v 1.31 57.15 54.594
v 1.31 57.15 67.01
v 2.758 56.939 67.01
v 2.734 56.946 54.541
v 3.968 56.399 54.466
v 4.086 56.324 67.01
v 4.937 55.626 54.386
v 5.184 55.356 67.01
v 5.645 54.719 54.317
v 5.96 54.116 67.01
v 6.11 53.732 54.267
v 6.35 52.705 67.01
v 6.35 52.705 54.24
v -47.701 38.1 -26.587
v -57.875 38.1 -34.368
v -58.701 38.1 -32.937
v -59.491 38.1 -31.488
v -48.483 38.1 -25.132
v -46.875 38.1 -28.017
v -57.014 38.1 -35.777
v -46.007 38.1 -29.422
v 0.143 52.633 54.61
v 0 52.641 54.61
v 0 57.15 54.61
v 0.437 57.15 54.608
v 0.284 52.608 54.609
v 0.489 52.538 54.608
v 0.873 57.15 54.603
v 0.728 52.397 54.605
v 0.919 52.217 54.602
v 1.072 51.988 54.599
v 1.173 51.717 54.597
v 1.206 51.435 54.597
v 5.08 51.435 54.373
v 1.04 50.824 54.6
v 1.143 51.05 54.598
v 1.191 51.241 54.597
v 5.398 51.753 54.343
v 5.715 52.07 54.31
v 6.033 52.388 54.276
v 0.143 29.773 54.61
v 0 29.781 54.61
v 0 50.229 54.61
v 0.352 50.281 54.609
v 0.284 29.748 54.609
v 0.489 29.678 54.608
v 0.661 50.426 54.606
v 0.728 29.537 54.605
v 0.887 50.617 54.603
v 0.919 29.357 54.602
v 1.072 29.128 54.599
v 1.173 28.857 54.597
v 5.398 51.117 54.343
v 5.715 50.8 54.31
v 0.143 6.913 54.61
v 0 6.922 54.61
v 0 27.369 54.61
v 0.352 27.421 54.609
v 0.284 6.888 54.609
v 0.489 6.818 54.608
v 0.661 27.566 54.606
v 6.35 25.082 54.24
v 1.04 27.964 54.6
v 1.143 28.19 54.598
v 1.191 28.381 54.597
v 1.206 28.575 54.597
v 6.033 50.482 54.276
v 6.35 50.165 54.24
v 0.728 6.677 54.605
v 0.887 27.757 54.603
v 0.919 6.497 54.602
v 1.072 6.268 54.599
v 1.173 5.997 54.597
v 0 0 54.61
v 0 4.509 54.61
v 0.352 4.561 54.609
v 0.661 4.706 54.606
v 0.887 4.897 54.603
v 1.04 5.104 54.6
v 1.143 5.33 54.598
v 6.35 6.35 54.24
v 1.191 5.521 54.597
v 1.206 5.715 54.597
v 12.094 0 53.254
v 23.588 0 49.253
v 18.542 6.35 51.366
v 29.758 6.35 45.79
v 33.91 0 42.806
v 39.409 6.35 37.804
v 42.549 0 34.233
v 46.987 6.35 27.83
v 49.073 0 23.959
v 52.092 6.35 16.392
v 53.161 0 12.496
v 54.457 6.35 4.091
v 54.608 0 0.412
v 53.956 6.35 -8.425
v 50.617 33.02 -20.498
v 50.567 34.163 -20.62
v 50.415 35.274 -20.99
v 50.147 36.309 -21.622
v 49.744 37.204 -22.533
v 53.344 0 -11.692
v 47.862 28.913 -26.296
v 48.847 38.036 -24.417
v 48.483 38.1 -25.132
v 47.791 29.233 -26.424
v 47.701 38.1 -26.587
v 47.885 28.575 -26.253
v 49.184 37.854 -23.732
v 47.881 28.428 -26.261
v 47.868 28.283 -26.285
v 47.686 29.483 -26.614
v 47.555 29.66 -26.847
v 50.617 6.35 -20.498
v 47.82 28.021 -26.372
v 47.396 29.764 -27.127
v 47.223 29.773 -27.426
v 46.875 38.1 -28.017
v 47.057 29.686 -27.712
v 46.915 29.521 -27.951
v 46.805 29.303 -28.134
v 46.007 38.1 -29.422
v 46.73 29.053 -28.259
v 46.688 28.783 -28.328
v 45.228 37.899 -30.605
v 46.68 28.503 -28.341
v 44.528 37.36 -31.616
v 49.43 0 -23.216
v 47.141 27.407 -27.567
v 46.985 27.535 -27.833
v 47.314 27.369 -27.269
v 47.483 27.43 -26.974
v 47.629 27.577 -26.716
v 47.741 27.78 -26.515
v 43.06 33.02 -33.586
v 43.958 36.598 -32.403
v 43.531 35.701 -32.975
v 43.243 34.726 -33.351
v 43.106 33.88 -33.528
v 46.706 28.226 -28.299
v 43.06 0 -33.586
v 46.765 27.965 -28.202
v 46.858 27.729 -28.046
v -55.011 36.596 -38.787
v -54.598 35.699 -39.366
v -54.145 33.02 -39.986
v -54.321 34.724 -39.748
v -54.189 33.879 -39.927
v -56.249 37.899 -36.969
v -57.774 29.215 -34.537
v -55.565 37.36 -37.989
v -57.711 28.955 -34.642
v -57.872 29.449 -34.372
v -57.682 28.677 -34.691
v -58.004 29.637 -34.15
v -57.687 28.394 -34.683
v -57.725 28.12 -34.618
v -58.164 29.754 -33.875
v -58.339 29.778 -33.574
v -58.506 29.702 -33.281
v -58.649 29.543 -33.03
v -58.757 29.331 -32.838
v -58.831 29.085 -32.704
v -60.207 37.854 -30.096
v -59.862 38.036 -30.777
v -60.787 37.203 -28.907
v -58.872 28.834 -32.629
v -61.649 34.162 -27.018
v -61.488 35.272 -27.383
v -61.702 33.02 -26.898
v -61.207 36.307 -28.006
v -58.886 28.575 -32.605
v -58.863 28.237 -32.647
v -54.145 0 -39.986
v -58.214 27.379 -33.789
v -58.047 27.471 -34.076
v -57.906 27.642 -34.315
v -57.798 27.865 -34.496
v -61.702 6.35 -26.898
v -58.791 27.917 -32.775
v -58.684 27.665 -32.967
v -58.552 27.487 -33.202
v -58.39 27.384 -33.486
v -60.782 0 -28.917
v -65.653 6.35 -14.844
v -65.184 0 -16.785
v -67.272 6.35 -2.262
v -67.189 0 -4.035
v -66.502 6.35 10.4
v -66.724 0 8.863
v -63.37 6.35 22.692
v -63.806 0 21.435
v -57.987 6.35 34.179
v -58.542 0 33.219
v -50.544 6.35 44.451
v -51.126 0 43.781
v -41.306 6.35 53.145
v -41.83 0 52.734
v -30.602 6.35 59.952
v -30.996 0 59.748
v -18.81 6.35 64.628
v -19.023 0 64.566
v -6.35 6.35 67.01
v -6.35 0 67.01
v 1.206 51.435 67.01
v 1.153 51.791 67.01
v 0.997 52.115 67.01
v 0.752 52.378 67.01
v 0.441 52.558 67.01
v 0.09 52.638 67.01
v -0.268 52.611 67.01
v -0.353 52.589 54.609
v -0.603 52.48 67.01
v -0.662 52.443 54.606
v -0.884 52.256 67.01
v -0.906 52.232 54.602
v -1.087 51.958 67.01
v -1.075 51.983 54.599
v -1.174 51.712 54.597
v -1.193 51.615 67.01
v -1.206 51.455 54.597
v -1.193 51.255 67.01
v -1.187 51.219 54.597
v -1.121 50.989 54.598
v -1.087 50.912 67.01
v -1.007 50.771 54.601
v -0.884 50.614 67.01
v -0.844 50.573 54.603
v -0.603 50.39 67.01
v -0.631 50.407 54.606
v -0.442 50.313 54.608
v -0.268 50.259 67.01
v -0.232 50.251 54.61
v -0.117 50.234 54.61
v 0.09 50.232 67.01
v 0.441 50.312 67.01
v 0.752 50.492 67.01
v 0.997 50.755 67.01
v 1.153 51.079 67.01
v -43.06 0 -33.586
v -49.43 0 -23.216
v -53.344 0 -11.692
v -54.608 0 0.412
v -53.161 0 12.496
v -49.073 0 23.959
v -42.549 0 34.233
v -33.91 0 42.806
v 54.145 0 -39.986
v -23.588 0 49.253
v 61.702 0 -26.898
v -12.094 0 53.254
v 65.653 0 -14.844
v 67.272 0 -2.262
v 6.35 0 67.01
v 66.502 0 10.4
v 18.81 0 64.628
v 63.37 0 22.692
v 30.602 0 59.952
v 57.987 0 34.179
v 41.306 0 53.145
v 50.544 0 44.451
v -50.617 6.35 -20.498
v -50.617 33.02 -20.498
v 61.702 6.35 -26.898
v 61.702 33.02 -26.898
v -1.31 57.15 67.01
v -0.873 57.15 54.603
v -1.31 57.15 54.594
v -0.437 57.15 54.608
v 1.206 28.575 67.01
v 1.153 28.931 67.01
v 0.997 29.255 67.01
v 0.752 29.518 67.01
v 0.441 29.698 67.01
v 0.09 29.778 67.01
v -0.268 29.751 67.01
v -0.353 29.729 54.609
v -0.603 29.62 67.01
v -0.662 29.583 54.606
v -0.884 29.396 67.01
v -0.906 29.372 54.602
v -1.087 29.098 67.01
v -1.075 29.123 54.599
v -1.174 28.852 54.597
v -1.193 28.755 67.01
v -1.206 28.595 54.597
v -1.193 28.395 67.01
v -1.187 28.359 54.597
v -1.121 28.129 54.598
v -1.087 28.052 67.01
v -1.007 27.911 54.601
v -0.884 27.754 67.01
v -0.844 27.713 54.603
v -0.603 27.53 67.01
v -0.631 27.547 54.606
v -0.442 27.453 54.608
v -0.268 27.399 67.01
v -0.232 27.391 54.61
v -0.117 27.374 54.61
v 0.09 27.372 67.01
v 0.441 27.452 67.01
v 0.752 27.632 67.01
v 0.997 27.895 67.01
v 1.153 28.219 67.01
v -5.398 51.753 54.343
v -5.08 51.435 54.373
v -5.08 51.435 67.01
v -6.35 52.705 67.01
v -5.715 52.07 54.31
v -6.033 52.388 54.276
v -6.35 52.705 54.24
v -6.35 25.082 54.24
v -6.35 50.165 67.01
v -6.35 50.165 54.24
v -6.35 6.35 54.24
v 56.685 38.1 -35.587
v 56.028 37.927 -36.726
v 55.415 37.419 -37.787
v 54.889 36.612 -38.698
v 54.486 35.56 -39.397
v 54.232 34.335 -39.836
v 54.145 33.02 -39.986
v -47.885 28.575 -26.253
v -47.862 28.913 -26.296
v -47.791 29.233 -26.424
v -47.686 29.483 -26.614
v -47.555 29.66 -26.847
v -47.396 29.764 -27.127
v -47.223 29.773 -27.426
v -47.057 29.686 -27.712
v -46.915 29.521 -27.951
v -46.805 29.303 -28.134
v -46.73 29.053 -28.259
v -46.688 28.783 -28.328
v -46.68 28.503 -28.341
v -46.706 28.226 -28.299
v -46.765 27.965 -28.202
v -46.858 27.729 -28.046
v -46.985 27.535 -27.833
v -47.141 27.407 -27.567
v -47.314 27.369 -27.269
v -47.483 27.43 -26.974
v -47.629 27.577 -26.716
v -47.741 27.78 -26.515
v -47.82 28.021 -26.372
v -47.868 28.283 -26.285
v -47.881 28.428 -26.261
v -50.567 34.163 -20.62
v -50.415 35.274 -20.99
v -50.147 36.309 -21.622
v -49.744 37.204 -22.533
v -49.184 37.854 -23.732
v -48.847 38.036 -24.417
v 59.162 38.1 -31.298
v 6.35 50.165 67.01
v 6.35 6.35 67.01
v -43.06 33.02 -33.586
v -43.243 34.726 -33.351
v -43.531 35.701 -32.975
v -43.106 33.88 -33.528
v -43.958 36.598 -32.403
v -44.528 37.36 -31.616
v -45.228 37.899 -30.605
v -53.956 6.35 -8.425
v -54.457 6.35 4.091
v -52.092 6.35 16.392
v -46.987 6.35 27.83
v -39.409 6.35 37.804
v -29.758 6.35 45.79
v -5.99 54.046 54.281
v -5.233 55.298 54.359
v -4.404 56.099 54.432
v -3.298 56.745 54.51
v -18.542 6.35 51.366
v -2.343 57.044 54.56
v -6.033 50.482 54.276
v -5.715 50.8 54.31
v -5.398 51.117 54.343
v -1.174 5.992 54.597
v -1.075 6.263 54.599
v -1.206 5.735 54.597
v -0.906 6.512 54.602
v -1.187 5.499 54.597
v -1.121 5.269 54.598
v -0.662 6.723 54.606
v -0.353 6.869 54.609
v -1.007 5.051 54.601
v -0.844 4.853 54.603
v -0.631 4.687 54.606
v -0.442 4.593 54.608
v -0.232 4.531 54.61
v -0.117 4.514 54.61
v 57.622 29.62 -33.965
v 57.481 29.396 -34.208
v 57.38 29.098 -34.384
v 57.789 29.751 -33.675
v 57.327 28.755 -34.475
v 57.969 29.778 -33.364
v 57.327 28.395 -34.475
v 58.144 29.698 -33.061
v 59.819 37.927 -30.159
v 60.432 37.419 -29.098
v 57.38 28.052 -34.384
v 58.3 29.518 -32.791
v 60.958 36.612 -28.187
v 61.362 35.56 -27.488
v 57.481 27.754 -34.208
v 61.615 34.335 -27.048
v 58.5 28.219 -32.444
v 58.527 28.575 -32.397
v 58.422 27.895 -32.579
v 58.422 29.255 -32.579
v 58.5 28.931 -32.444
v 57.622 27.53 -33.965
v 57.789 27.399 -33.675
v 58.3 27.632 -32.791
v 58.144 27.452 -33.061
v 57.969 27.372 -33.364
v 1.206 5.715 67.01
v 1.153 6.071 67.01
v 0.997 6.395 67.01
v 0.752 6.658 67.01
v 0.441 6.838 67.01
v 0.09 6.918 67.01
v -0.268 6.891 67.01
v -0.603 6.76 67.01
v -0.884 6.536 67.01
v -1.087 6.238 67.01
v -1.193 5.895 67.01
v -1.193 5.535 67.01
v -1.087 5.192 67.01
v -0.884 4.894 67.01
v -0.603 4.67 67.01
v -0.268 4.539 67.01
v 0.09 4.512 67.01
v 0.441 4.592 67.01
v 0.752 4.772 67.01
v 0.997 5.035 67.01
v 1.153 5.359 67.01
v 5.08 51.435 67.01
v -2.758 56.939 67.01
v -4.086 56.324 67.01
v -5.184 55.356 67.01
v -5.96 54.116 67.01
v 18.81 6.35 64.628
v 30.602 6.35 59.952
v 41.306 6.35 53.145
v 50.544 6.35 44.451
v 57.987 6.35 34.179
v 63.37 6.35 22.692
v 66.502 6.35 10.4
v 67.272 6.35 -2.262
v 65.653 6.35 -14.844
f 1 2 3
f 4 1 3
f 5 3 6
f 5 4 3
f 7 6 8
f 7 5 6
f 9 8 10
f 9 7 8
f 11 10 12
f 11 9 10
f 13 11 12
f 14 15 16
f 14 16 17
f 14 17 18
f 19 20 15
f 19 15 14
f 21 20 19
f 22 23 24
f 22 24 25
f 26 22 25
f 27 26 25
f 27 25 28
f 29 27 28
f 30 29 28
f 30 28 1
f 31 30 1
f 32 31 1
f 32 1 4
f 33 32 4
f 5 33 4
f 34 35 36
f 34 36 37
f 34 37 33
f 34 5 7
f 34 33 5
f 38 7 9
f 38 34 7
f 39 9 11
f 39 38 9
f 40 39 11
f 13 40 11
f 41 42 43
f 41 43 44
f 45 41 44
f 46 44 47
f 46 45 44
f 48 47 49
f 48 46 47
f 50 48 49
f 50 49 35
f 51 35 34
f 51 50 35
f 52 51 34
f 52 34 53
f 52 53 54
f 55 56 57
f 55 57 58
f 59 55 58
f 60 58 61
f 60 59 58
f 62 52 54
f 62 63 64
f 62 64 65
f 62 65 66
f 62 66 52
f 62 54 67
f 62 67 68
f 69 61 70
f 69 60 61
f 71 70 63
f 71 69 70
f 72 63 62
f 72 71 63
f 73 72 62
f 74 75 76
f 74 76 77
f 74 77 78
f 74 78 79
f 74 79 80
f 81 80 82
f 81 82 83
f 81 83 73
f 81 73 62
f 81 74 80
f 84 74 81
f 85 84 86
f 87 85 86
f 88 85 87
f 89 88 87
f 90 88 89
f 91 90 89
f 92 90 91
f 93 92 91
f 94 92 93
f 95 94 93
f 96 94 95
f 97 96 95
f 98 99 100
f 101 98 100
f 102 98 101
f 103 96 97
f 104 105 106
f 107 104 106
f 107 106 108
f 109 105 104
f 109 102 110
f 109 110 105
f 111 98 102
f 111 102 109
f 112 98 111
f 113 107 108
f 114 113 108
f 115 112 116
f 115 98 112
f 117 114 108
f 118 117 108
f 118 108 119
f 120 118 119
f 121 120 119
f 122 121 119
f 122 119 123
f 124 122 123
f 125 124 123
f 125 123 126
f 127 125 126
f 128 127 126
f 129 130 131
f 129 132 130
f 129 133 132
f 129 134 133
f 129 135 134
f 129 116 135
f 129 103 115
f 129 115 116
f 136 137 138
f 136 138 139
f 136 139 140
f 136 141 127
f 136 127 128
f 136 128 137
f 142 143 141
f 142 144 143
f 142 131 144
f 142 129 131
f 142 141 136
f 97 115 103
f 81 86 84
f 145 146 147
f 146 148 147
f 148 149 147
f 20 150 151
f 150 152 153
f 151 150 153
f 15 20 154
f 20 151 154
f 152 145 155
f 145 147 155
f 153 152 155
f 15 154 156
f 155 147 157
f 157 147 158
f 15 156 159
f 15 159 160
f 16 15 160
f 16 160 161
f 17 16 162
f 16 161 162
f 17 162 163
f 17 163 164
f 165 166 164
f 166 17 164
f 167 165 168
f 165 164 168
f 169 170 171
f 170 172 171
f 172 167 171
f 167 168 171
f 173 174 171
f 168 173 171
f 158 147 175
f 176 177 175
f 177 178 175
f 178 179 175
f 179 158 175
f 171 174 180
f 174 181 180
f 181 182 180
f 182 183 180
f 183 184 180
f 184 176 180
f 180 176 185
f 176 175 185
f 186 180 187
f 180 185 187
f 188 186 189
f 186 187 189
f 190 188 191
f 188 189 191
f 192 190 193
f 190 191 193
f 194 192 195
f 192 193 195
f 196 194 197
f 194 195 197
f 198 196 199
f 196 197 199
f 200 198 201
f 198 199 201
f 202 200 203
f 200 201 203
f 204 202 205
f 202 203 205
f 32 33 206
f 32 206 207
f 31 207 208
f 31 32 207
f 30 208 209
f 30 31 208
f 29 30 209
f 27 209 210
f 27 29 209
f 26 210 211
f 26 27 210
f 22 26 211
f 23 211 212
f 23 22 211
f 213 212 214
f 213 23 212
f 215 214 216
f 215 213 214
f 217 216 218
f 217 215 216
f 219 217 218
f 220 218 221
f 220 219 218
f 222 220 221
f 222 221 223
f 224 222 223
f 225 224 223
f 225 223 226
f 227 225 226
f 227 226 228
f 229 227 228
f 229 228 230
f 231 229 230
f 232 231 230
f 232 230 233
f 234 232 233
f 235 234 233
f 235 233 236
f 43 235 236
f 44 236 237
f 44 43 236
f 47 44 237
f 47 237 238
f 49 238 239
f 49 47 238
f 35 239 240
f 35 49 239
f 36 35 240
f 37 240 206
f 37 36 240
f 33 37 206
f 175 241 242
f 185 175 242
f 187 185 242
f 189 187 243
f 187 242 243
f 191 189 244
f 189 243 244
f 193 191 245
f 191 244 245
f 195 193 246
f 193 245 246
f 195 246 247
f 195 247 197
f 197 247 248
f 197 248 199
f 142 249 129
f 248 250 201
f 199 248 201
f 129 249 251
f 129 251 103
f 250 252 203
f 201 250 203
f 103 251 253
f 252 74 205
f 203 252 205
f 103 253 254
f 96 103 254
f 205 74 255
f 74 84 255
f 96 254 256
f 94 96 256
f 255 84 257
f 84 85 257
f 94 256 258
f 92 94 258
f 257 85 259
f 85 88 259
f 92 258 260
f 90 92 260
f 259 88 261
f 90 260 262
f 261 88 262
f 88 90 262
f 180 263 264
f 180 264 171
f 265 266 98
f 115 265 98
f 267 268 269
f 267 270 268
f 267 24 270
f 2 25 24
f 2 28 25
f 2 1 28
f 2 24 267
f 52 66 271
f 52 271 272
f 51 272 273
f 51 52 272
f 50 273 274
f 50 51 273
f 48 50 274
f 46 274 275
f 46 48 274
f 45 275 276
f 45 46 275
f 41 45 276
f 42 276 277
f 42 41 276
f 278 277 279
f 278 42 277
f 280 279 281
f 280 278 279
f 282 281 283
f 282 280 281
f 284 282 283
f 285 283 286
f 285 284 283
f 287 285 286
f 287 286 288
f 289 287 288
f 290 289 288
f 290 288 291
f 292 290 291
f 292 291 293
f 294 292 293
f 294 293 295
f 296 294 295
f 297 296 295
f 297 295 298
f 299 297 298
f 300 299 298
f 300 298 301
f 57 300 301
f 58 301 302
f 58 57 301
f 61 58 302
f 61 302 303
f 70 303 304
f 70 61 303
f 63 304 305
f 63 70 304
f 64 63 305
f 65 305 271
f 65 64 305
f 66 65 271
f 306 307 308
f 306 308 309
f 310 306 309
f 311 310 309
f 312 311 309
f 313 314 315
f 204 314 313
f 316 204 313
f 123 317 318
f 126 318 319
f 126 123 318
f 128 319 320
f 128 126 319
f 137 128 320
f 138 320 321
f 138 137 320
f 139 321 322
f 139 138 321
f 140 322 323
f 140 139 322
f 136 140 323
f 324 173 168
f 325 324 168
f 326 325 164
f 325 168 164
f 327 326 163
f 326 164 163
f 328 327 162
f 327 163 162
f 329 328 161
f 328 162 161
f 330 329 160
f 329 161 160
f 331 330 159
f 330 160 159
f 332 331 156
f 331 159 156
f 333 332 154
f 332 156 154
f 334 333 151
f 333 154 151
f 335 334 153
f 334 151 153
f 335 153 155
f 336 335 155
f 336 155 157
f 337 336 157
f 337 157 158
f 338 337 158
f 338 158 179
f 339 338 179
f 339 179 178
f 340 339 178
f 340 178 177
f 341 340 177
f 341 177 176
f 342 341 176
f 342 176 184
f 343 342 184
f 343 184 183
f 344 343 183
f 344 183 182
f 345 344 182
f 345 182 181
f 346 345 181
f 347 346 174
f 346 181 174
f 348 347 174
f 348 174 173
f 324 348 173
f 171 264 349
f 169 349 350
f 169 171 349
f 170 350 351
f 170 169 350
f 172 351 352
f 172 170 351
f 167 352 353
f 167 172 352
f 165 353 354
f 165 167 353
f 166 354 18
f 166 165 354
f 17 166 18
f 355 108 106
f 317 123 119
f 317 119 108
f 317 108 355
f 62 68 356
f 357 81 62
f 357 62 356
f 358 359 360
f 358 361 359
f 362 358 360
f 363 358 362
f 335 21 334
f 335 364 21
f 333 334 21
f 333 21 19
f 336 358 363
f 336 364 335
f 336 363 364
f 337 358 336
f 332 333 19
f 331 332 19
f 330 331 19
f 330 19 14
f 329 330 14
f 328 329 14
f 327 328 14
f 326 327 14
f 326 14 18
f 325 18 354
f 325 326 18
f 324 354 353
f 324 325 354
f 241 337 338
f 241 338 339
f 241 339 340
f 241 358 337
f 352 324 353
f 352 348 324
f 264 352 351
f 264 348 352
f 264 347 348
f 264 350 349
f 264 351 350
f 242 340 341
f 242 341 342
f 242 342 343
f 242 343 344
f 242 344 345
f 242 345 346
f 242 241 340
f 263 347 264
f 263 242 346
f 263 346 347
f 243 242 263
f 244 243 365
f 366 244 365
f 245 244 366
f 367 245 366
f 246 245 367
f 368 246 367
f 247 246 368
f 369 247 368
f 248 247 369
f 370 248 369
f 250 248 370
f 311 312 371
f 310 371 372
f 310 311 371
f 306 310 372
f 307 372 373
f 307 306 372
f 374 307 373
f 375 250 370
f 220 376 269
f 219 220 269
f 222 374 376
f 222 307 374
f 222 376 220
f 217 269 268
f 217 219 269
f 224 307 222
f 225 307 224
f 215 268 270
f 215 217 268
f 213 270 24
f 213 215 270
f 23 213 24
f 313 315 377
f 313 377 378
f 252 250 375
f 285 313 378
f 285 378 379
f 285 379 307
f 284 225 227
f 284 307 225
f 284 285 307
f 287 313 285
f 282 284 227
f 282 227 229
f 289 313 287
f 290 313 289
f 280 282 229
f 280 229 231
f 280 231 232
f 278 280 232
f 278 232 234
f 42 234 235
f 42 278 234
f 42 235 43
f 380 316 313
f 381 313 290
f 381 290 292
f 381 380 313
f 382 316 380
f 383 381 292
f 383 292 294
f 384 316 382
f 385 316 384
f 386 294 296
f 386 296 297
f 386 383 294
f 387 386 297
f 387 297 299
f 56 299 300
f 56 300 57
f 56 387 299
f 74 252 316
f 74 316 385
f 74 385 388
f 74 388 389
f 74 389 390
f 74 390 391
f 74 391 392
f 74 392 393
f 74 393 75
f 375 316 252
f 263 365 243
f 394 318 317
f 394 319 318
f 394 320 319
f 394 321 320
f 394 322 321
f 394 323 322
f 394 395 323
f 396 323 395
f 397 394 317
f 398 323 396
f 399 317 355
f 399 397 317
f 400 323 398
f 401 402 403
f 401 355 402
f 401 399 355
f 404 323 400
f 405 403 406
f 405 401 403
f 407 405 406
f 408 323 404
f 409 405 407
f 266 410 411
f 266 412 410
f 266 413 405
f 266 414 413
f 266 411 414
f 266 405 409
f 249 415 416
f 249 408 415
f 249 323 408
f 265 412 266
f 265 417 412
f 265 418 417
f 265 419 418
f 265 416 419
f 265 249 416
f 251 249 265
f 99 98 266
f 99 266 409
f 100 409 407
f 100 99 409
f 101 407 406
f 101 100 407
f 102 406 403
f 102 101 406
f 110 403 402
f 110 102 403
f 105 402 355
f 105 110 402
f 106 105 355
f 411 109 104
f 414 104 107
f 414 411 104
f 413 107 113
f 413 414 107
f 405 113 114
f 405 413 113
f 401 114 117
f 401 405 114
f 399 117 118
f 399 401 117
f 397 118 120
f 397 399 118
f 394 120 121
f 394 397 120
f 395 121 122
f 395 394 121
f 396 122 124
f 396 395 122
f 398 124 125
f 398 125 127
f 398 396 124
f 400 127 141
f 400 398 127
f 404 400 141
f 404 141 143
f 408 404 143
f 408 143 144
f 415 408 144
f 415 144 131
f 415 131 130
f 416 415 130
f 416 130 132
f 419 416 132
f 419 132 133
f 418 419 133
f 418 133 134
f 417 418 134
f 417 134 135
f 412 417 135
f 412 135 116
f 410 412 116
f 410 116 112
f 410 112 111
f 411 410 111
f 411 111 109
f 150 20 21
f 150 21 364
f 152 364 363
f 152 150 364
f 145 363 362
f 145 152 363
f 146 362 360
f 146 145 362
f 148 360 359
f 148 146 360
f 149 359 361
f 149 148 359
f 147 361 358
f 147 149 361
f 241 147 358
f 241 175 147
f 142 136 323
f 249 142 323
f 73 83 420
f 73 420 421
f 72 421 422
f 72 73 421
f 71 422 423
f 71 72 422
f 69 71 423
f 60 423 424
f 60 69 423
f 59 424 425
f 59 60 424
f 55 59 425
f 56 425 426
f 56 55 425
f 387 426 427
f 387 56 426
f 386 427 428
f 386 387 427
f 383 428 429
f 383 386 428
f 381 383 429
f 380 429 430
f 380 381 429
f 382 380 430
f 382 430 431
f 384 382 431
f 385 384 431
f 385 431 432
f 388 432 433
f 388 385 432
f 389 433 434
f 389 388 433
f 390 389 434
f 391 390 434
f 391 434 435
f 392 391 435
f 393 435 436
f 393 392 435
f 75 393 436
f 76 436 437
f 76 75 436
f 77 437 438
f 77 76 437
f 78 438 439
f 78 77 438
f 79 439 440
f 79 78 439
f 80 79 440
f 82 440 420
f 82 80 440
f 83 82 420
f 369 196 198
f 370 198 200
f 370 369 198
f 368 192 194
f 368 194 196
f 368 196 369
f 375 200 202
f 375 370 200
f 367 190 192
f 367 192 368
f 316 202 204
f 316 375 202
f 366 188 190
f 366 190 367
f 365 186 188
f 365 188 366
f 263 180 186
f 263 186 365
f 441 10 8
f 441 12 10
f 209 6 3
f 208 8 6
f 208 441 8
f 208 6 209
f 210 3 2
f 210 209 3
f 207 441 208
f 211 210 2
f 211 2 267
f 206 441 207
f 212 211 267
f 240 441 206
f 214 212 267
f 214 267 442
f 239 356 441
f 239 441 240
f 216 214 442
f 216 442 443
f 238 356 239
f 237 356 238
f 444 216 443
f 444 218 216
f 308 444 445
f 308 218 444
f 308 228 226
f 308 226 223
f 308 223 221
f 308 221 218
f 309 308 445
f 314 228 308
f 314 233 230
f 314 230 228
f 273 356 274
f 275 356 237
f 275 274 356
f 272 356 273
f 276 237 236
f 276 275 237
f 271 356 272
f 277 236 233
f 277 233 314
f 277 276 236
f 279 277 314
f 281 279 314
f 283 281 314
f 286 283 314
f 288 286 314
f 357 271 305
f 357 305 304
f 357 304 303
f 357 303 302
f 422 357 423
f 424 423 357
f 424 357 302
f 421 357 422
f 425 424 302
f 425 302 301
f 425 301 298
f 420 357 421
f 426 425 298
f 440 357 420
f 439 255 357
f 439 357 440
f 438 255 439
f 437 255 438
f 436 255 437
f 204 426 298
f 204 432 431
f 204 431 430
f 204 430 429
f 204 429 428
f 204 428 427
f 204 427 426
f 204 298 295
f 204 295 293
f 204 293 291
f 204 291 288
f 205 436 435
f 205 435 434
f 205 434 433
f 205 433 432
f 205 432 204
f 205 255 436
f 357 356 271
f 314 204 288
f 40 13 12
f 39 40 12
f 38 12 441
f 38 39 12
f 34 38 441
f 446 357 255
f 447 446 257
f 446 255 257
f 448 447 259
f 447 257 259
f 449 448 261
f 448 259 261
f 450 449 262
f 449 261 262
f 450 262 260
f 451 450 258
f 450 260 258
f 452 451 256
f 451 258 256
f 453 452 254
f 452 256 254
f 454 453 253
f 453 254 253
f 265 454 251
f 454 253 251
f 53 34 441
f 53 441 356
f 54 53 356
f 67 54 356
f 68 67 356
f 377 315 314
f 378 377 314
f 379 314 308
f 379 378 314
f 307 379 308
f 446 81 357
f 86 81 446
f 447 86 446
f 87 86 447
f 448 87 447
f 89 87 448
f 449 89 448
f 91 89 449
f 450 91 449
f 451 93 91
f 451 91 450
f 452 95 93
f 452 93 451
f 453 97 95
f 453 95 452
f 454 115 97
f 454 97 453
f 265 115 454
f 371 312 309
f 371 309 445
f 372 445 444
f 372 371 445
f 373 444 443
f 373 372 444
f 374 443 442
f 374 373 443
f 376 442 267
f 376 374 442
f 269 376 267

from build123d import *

# Parameters (mm, degrees)
SKETCH1_R               = 67.31
SKETCH1_R_2             = 54.61
BOSS_EXTRUDE1_DEPTH     = 57.15
CUT_EXTRUDE1_DEPTH      = 161.994729727
CUT_EXTRUDE1_DEPTH_BACK = 161.994729727
SKETCH2_R               = 1.2065
SKETCH3_R               = 1.2065
CUT_EXTRUDE2_DEPTH      = 171.985259226
CUT_EXTRUDE3_START      = -50.8
CUT_EXTRUDE3_DEPTH      = 50.8
SKETCH5_W               = 12.7
SKETCH5_H               = 152.473493429
CUT_EXTRUDE4_DEPTH      = 50.8
CUT_EXTRUDE5_START      = -19.05
CUT_EXTRUDE5_DEPTH      = 19.05
CUT_EXTRUDE6_START      = -19.05
CUT_EXTRUDE6_DEPTH      = 19.05
FILLET1_START           = 53
FILLET1_DEPTH           = 15
FILLET1_2_DEPTH         = 15
FILLET1_START_2         = -67.31
FILLET1_3_DEPTH         = 14.31
CUT_EXTRUDE7_START      = -19.05
CUT_EXTRUDE7_DEPTH      = 19.05


with BuildPart() as part:
    # Sketch1 → Boss-Extrude1 (new body)
    with BuildSketch(Plane(origin=(0, 0, 0), x_dir=(1, 0, 0), z_dir=(0, 1, 0))):
        with Locations(Location((0, 0, 0), (0, 0, 270))):
            Circle(SKETCH1_R)
        with Locations(Location((0, 0, 0), (0, 0, 270))):
            Circle(SKETCH1_R_2, mode=Mode.SUBTRACT)
    extrude(amount=BOSS_EXTRUDE1_DEPTH)

    # Sketch2 → Cut-Extrude1 (cut, two sides: drawn at the far end of the back side and taken through both)
    with BuildSketch(Plane.XY.offset(67.31).offset(-CUT_EXTRUDE1_DEPTH_BACK)):
        Polygon((-5.08, 51.435), (-6.35, 52.705), (-6.35, 50.165), align=None)
        Polygon((-6.35, 52.705), (-6.35, 57.15), (-19.05, 57.15), (-19.05, 25.0825), (-6.35, 25.0825), (-6.35, 50.165), align=None)
        Polygon((5.08, 51.435), (6.35, 50.165), (6.35, 52.705), align=None)
        Polygon((6.35, 50.165), (6.35, 25.0825), (19.05, 25.0825), (19.05, 57.15), (6.35, 57.15), (6.35, 52.705), align=None)
        with Locations((0, 51.435)):
            Circle(SKETCH2_R)
        with Locations((0, 28.575)):
            Circle(SKETCH2_R)
        with Locations((0, 5.715)):
            Circle(SKETCH2_R)
    extrude(amount=CUT_EXTRUDE1_DEPTH + CUT_EXTRUDE1_DEPTH_BACK, mode=Mode.SUBTRACT)

    # Sketch3 → Cut-Extrude2 (cut, through all)
    with BuildSketch(Plane(origin=(-58.292169929, 0, -33.655), x_dir=(0, -1, 0), z_dir=(-0.8660254037844364, 0, -0.5000000000000041))):
        with Locations(Location((-28.575, 0, 0), (0, 0, 90))):
            Circle(SKETCH3_R)
    cut_extrude2 = extrude(amount=-CUT_EXTRUDE2_DEPTH, mode=Mode.SUBTRACT)

    # Mirror1: Cut-Extrude2 across plane
    add(cut_extrude2.mirror(Plane(origin=(0, 0, 0), x_dir=(0, 0, 1), z_dir=(1, 0, 0))), mode=Mode.SUBTRACT)

    # Cut-Extrude3: read off the stored shape, not the designer's step
    # Cut-Extrude3 outline → Cut-Extrude3 (cut)
    with BuildSketch(Plane(origin=(0, 57.15, 0), x_dir=(1, 0, 0), z_dir=(0, 1, 0)).offset(CUT_EXTRUDE3_START)):
        with BuildLine():
            ThreePointArc((-6.35, -67.009802268), (0, -67.31), (6.35, -67.009802268))
            Line((6.35, -67.009802268), (-6.35, -67.009802268))
        make_face()
        with BuildLine():
            Line((6.35, -54.23955752), (6.35, -67.009802268))
            ThreePointArc((6.35, -67.009802268), (57.986556059, -34.178873833), (61.701920082, 26.898125551))
            Line((61.701920082, 26.898125551), (50.616947204, 20.498213476))
            ThreePointArc((50.616947204, 20.498213476), (46.986613751, -27.830023862), (6.35, -54.23955752))
        make_face()
        with BuildLine():
            Line((-6.35, -67.009802268), (-6.35, -54.23955752))
            ThreePointArc((-6.35, -54.23955752), (-46.986613751, -27.830023862), (-50.616947204, 20.498213476))
            Line((-50.616947204, 20.498213476), (-61.701920082, 26.898125551))
            ThreePointArc((-61.701920082, 26.898125551), (-57.986556059, -34.178873833), (-6.35, -67.009802268))
        make_face()
        with BuildLine():
            Line((54.145420082, 39.986367478), (61.701920082, 26.898125551))
            ThreePointArc((61.701920082, 26.898125551), (58.292169929, 33.655), (54.145420082, 39.986367478))
        make_face()
        with BuildLine():
            Line((-54.145420082, 39.986367478), (-43.060447204, 33.586455403))
            ThreePointArc((-43.060447204, 33.586455403), (0, 54.61), (43.060447204, 33.586455403))
            Line((43.060447204, 33.586455403), (54.145420082, 39.986367478))
            ThreePointArc((54.145420082, 39.986367478), (0, 67.31), (-54.145420082, 39.986367478))
        make_face()
    extrude(amount=CUT_EXTRUDE3_DEPTH, mode=Mode.SUBTRACT)

    # Sketch5 → Cut-Extrude4 (cut)
    with BuildSketch(Plane(origin=(0, 6.35, 0), x_dir=(1, 0, 0), z_dir=(0, 1, 0))):
        with Locations((0, 21.997189195)):
            Rectangle(SKETCH5_W, SKETCH5_H)
    extrude(amount=-CUT_EXTRUDE4_DEPTH, mode=Mode.SUBTRACT)

    # Sketch6 → Cut-Extrude5 (cut)
    with BuildSketch(Plane(origin=(0, 57.15, 0), x_dir=(1, 0, 0), z_dir=(0, 1, 0)).offset(CUT_EXTRUDE5_START)):
        with BuildLine():
            Line((50.616947204, 20.498213476), (61.701920082, 26.898125551))
            Line((61.701920082, 26.898125551), (54.145420082, 39.986367478))
            Line((54.145420082, 39.986367478), (43.060447204, 33.586455403))
            ThreePointArc((43.060447204, 33.586455403), (47.293647301, 27.305), (50.616947204, 20.498213476))
        make_face()
        with BuildLine():
            Line((-61.701920082, 26.898125551), (-50.616947204, 20.498213476))
            ThreePointArc((-50.616947204, 20.498213476), (-47.293647301, 27.305), (-43.060447204, 33.586455403))
            Line((-43.060447204, 33.586455403), (-54.145420082, 39.986367478))
            ThreePointArc((-54.145420082, 39.986367478), (-58.292169929, 33.655), (-61.701920082, 26.898125551))
        make_face()
    extrude(amount=CUT_EXTRUDE5_DEPTH, mode=Mode.SUBTRACT)

    # Sketch7 → Cut-Extrude6 (cut)
    with BuildSketch(Plane(origin=(0, 6.35, 0), x_dir=(1, 0, 0), z_dir=(0, 1, 0)).offset(CUT_EXTRUDE6_START)):
        with BuildLine():
            Line((6.35, 67.009802268), (6.35, 54.23955752))
            ThreePointArc((6.35, 54.23955752), (26.776589215, 47.594814528), (43.060447204, 33.586455403))
            Line((43.060447204, 33.586455403), (54.145420082, 39.986367478))
            ThreePointArc((54.145420082, 39.986367478), (33.128393708, 58.593051041), (6.35, 67.009802268))
        make_face()
        with BuildLine():
            Line((-6.35, 54.23955752), (-6.35, 67.009802268))
            ThreePointArc((-6.35, 67.009802268), (-33.128393708, 58.593051041), (-54.145420082, 39.986367478))
            Line((-54.145420082, 39.986367478), (-43.060447204, 33.586455403))
            ThreePointArc((-43.060447204, 33.586455403), (-26.776589215, 47.594814528), (-6.35, 54.23955752))
        make_face()
    extrude(amount=CUT_EXTRUDE6_DEPTH, mode=Mode.SUBTRACT)

    # Fillet1: read off the stored shape, not the designer's step
    # Fillet1 outline → Fillet1 (cut)
    with BuildSketch(Plane.XY.offset(FILLET1_START)):
        with BuildLine():
            Line((6.35, 57.15), (1.309843752, 57.15))
            ThreePointArc((1.309843752, 57.15), (4.669947917, 55.88), (6.35, 52.705))
            Line((6.35, 52.705), (6.35, 57.15))
        make_face()
        with BuildLine():
            ThreePointArc((-6.35, 52.705), (-4.669947917, 55.88), (-1.309843752, 57.15))
            Line((-1.309843752, 57.15), (-6.35, 57.15))
            Line((-6.35, 57.15), (-6.35, 52.705))
        make_face()
    extrude(amount=FILLET1_DEPTH, mode=Mode.SUBTRACT)

    # Fillet1 2 outline → Fillet1 2 (cut)
    with BuildSketch(Plane(origin=(0, 0, 0), x_dir=(0.5000000000000049, 0, 0.8660254037844358), z_dir=(0.8660254037844358, 0, -0.5000000000000049)).offset(FILLET1_START)):
        with BuildLine():
            Line((7.5565, -38.1), (7.5565, -33.02))
            ThreePointArc((7.5565, -33.02), (6.068602448, -36.612102448), (2.4765, -38.1))
            Line((2.4765, -38.1), (7.5565, -38.1))
        make_face()
        with BuildLine():
            Line((-7.5565, -38.1), (-2.4765, -38.1))
            ThreePointArc((-2.4765, -38.1), (-6.068602448, -36.612102448), (-7.5565, -33.02))
            Line((-7.5565, -33.02), (-7.5565, -38.1))
        make_face()
    extrude(amount=FILLET1_2_DEPTH, mode=Mode.SUBTRACT)

    # Fillet1 3 outline → Fillet1 3 (cut)
    with BuildSketch(Plane(origin=(0, 0, 0), x_dir=(0.49999999999999956, 0, -0.8660254037844389), z_dir=(0.8660254037844388, 0, 0.4999999999999999)).offset(FILLET1_START_2)):
        with BuildLine():
            Line((7.5565, 38.1), (2.4765, 38.1))
            ThreePointArc((2.4765, 38.1), (6.068602448, 36.612102448), (7.5565, 33.02))
            Line((7.5565, 33.02), (7.5565, 38.1))
        make_face()
        with BuildLine():
            ThreePointArc((-7.5565, 33.02), (-6.068602448, 36.612102448), (-2.4765, 38.1))
            Line((-2.4765, 38.1), (-7.5565, 38.1))
            Line((-7.5565, 38.1), (-7.5565, 33.02))
        make_face()
    extrude(amount=FILLET1_3_DEPTH, mode=Mode.SUBTRACT)

    # Sketch8 → Cut-Extrude7 (cut)
    with BuildSketch(Plane(origin=(0, 6.35, 0), x_dir=(1, 0, 0), z_dir=(0, 1, 0)).offset(CUT_EXTRUDE7_START)):
        with BuildLine():
            ThreePointArc((-6.35, -67.009802268), (-3.690833292, -67.208733433), (-1.025873896, -67.302181857))
            Line((-1.025873896, -67.302181857), (-1.025873896, -67.009802268))
            Line((-1.025873896, -67.009802268), (-6.35, -67.009802268))
        make_face()
        Polygon((-1.025873896, -67.009802268), (-1.025873896, -67.302181857), (-1.551971907, -68.232150278), (0.972160244, -68.180468419), (1.025873896, -67.302181857), (1.025873896, -67.009802268), align=None)
        with BuildLine():
            Line((6.35, -67.009802268), (1.025873896, -67.009802268))
            Line((1.025873896, -67.009802268), (1.025873896, -67.302181857))
            ThreePointArc((1.025873896, -67.302181857), (3.690833292, -67.208733433), (6.35, -67.009802268))
        make_face()
        with BuildLine():
            ThreePointArc((61.701920082, 26.898125551), (58.292169929, 33.655), (54.145420082, 39.986367478))
            Line((54.145420082, 39.986367478), (61.701920082, 26.898125551))
        make_face()
    extrude(amount=CUT_EXTRUDE7_DEPTH, mode=Mode.SUBTRACT)


solid = part.part
